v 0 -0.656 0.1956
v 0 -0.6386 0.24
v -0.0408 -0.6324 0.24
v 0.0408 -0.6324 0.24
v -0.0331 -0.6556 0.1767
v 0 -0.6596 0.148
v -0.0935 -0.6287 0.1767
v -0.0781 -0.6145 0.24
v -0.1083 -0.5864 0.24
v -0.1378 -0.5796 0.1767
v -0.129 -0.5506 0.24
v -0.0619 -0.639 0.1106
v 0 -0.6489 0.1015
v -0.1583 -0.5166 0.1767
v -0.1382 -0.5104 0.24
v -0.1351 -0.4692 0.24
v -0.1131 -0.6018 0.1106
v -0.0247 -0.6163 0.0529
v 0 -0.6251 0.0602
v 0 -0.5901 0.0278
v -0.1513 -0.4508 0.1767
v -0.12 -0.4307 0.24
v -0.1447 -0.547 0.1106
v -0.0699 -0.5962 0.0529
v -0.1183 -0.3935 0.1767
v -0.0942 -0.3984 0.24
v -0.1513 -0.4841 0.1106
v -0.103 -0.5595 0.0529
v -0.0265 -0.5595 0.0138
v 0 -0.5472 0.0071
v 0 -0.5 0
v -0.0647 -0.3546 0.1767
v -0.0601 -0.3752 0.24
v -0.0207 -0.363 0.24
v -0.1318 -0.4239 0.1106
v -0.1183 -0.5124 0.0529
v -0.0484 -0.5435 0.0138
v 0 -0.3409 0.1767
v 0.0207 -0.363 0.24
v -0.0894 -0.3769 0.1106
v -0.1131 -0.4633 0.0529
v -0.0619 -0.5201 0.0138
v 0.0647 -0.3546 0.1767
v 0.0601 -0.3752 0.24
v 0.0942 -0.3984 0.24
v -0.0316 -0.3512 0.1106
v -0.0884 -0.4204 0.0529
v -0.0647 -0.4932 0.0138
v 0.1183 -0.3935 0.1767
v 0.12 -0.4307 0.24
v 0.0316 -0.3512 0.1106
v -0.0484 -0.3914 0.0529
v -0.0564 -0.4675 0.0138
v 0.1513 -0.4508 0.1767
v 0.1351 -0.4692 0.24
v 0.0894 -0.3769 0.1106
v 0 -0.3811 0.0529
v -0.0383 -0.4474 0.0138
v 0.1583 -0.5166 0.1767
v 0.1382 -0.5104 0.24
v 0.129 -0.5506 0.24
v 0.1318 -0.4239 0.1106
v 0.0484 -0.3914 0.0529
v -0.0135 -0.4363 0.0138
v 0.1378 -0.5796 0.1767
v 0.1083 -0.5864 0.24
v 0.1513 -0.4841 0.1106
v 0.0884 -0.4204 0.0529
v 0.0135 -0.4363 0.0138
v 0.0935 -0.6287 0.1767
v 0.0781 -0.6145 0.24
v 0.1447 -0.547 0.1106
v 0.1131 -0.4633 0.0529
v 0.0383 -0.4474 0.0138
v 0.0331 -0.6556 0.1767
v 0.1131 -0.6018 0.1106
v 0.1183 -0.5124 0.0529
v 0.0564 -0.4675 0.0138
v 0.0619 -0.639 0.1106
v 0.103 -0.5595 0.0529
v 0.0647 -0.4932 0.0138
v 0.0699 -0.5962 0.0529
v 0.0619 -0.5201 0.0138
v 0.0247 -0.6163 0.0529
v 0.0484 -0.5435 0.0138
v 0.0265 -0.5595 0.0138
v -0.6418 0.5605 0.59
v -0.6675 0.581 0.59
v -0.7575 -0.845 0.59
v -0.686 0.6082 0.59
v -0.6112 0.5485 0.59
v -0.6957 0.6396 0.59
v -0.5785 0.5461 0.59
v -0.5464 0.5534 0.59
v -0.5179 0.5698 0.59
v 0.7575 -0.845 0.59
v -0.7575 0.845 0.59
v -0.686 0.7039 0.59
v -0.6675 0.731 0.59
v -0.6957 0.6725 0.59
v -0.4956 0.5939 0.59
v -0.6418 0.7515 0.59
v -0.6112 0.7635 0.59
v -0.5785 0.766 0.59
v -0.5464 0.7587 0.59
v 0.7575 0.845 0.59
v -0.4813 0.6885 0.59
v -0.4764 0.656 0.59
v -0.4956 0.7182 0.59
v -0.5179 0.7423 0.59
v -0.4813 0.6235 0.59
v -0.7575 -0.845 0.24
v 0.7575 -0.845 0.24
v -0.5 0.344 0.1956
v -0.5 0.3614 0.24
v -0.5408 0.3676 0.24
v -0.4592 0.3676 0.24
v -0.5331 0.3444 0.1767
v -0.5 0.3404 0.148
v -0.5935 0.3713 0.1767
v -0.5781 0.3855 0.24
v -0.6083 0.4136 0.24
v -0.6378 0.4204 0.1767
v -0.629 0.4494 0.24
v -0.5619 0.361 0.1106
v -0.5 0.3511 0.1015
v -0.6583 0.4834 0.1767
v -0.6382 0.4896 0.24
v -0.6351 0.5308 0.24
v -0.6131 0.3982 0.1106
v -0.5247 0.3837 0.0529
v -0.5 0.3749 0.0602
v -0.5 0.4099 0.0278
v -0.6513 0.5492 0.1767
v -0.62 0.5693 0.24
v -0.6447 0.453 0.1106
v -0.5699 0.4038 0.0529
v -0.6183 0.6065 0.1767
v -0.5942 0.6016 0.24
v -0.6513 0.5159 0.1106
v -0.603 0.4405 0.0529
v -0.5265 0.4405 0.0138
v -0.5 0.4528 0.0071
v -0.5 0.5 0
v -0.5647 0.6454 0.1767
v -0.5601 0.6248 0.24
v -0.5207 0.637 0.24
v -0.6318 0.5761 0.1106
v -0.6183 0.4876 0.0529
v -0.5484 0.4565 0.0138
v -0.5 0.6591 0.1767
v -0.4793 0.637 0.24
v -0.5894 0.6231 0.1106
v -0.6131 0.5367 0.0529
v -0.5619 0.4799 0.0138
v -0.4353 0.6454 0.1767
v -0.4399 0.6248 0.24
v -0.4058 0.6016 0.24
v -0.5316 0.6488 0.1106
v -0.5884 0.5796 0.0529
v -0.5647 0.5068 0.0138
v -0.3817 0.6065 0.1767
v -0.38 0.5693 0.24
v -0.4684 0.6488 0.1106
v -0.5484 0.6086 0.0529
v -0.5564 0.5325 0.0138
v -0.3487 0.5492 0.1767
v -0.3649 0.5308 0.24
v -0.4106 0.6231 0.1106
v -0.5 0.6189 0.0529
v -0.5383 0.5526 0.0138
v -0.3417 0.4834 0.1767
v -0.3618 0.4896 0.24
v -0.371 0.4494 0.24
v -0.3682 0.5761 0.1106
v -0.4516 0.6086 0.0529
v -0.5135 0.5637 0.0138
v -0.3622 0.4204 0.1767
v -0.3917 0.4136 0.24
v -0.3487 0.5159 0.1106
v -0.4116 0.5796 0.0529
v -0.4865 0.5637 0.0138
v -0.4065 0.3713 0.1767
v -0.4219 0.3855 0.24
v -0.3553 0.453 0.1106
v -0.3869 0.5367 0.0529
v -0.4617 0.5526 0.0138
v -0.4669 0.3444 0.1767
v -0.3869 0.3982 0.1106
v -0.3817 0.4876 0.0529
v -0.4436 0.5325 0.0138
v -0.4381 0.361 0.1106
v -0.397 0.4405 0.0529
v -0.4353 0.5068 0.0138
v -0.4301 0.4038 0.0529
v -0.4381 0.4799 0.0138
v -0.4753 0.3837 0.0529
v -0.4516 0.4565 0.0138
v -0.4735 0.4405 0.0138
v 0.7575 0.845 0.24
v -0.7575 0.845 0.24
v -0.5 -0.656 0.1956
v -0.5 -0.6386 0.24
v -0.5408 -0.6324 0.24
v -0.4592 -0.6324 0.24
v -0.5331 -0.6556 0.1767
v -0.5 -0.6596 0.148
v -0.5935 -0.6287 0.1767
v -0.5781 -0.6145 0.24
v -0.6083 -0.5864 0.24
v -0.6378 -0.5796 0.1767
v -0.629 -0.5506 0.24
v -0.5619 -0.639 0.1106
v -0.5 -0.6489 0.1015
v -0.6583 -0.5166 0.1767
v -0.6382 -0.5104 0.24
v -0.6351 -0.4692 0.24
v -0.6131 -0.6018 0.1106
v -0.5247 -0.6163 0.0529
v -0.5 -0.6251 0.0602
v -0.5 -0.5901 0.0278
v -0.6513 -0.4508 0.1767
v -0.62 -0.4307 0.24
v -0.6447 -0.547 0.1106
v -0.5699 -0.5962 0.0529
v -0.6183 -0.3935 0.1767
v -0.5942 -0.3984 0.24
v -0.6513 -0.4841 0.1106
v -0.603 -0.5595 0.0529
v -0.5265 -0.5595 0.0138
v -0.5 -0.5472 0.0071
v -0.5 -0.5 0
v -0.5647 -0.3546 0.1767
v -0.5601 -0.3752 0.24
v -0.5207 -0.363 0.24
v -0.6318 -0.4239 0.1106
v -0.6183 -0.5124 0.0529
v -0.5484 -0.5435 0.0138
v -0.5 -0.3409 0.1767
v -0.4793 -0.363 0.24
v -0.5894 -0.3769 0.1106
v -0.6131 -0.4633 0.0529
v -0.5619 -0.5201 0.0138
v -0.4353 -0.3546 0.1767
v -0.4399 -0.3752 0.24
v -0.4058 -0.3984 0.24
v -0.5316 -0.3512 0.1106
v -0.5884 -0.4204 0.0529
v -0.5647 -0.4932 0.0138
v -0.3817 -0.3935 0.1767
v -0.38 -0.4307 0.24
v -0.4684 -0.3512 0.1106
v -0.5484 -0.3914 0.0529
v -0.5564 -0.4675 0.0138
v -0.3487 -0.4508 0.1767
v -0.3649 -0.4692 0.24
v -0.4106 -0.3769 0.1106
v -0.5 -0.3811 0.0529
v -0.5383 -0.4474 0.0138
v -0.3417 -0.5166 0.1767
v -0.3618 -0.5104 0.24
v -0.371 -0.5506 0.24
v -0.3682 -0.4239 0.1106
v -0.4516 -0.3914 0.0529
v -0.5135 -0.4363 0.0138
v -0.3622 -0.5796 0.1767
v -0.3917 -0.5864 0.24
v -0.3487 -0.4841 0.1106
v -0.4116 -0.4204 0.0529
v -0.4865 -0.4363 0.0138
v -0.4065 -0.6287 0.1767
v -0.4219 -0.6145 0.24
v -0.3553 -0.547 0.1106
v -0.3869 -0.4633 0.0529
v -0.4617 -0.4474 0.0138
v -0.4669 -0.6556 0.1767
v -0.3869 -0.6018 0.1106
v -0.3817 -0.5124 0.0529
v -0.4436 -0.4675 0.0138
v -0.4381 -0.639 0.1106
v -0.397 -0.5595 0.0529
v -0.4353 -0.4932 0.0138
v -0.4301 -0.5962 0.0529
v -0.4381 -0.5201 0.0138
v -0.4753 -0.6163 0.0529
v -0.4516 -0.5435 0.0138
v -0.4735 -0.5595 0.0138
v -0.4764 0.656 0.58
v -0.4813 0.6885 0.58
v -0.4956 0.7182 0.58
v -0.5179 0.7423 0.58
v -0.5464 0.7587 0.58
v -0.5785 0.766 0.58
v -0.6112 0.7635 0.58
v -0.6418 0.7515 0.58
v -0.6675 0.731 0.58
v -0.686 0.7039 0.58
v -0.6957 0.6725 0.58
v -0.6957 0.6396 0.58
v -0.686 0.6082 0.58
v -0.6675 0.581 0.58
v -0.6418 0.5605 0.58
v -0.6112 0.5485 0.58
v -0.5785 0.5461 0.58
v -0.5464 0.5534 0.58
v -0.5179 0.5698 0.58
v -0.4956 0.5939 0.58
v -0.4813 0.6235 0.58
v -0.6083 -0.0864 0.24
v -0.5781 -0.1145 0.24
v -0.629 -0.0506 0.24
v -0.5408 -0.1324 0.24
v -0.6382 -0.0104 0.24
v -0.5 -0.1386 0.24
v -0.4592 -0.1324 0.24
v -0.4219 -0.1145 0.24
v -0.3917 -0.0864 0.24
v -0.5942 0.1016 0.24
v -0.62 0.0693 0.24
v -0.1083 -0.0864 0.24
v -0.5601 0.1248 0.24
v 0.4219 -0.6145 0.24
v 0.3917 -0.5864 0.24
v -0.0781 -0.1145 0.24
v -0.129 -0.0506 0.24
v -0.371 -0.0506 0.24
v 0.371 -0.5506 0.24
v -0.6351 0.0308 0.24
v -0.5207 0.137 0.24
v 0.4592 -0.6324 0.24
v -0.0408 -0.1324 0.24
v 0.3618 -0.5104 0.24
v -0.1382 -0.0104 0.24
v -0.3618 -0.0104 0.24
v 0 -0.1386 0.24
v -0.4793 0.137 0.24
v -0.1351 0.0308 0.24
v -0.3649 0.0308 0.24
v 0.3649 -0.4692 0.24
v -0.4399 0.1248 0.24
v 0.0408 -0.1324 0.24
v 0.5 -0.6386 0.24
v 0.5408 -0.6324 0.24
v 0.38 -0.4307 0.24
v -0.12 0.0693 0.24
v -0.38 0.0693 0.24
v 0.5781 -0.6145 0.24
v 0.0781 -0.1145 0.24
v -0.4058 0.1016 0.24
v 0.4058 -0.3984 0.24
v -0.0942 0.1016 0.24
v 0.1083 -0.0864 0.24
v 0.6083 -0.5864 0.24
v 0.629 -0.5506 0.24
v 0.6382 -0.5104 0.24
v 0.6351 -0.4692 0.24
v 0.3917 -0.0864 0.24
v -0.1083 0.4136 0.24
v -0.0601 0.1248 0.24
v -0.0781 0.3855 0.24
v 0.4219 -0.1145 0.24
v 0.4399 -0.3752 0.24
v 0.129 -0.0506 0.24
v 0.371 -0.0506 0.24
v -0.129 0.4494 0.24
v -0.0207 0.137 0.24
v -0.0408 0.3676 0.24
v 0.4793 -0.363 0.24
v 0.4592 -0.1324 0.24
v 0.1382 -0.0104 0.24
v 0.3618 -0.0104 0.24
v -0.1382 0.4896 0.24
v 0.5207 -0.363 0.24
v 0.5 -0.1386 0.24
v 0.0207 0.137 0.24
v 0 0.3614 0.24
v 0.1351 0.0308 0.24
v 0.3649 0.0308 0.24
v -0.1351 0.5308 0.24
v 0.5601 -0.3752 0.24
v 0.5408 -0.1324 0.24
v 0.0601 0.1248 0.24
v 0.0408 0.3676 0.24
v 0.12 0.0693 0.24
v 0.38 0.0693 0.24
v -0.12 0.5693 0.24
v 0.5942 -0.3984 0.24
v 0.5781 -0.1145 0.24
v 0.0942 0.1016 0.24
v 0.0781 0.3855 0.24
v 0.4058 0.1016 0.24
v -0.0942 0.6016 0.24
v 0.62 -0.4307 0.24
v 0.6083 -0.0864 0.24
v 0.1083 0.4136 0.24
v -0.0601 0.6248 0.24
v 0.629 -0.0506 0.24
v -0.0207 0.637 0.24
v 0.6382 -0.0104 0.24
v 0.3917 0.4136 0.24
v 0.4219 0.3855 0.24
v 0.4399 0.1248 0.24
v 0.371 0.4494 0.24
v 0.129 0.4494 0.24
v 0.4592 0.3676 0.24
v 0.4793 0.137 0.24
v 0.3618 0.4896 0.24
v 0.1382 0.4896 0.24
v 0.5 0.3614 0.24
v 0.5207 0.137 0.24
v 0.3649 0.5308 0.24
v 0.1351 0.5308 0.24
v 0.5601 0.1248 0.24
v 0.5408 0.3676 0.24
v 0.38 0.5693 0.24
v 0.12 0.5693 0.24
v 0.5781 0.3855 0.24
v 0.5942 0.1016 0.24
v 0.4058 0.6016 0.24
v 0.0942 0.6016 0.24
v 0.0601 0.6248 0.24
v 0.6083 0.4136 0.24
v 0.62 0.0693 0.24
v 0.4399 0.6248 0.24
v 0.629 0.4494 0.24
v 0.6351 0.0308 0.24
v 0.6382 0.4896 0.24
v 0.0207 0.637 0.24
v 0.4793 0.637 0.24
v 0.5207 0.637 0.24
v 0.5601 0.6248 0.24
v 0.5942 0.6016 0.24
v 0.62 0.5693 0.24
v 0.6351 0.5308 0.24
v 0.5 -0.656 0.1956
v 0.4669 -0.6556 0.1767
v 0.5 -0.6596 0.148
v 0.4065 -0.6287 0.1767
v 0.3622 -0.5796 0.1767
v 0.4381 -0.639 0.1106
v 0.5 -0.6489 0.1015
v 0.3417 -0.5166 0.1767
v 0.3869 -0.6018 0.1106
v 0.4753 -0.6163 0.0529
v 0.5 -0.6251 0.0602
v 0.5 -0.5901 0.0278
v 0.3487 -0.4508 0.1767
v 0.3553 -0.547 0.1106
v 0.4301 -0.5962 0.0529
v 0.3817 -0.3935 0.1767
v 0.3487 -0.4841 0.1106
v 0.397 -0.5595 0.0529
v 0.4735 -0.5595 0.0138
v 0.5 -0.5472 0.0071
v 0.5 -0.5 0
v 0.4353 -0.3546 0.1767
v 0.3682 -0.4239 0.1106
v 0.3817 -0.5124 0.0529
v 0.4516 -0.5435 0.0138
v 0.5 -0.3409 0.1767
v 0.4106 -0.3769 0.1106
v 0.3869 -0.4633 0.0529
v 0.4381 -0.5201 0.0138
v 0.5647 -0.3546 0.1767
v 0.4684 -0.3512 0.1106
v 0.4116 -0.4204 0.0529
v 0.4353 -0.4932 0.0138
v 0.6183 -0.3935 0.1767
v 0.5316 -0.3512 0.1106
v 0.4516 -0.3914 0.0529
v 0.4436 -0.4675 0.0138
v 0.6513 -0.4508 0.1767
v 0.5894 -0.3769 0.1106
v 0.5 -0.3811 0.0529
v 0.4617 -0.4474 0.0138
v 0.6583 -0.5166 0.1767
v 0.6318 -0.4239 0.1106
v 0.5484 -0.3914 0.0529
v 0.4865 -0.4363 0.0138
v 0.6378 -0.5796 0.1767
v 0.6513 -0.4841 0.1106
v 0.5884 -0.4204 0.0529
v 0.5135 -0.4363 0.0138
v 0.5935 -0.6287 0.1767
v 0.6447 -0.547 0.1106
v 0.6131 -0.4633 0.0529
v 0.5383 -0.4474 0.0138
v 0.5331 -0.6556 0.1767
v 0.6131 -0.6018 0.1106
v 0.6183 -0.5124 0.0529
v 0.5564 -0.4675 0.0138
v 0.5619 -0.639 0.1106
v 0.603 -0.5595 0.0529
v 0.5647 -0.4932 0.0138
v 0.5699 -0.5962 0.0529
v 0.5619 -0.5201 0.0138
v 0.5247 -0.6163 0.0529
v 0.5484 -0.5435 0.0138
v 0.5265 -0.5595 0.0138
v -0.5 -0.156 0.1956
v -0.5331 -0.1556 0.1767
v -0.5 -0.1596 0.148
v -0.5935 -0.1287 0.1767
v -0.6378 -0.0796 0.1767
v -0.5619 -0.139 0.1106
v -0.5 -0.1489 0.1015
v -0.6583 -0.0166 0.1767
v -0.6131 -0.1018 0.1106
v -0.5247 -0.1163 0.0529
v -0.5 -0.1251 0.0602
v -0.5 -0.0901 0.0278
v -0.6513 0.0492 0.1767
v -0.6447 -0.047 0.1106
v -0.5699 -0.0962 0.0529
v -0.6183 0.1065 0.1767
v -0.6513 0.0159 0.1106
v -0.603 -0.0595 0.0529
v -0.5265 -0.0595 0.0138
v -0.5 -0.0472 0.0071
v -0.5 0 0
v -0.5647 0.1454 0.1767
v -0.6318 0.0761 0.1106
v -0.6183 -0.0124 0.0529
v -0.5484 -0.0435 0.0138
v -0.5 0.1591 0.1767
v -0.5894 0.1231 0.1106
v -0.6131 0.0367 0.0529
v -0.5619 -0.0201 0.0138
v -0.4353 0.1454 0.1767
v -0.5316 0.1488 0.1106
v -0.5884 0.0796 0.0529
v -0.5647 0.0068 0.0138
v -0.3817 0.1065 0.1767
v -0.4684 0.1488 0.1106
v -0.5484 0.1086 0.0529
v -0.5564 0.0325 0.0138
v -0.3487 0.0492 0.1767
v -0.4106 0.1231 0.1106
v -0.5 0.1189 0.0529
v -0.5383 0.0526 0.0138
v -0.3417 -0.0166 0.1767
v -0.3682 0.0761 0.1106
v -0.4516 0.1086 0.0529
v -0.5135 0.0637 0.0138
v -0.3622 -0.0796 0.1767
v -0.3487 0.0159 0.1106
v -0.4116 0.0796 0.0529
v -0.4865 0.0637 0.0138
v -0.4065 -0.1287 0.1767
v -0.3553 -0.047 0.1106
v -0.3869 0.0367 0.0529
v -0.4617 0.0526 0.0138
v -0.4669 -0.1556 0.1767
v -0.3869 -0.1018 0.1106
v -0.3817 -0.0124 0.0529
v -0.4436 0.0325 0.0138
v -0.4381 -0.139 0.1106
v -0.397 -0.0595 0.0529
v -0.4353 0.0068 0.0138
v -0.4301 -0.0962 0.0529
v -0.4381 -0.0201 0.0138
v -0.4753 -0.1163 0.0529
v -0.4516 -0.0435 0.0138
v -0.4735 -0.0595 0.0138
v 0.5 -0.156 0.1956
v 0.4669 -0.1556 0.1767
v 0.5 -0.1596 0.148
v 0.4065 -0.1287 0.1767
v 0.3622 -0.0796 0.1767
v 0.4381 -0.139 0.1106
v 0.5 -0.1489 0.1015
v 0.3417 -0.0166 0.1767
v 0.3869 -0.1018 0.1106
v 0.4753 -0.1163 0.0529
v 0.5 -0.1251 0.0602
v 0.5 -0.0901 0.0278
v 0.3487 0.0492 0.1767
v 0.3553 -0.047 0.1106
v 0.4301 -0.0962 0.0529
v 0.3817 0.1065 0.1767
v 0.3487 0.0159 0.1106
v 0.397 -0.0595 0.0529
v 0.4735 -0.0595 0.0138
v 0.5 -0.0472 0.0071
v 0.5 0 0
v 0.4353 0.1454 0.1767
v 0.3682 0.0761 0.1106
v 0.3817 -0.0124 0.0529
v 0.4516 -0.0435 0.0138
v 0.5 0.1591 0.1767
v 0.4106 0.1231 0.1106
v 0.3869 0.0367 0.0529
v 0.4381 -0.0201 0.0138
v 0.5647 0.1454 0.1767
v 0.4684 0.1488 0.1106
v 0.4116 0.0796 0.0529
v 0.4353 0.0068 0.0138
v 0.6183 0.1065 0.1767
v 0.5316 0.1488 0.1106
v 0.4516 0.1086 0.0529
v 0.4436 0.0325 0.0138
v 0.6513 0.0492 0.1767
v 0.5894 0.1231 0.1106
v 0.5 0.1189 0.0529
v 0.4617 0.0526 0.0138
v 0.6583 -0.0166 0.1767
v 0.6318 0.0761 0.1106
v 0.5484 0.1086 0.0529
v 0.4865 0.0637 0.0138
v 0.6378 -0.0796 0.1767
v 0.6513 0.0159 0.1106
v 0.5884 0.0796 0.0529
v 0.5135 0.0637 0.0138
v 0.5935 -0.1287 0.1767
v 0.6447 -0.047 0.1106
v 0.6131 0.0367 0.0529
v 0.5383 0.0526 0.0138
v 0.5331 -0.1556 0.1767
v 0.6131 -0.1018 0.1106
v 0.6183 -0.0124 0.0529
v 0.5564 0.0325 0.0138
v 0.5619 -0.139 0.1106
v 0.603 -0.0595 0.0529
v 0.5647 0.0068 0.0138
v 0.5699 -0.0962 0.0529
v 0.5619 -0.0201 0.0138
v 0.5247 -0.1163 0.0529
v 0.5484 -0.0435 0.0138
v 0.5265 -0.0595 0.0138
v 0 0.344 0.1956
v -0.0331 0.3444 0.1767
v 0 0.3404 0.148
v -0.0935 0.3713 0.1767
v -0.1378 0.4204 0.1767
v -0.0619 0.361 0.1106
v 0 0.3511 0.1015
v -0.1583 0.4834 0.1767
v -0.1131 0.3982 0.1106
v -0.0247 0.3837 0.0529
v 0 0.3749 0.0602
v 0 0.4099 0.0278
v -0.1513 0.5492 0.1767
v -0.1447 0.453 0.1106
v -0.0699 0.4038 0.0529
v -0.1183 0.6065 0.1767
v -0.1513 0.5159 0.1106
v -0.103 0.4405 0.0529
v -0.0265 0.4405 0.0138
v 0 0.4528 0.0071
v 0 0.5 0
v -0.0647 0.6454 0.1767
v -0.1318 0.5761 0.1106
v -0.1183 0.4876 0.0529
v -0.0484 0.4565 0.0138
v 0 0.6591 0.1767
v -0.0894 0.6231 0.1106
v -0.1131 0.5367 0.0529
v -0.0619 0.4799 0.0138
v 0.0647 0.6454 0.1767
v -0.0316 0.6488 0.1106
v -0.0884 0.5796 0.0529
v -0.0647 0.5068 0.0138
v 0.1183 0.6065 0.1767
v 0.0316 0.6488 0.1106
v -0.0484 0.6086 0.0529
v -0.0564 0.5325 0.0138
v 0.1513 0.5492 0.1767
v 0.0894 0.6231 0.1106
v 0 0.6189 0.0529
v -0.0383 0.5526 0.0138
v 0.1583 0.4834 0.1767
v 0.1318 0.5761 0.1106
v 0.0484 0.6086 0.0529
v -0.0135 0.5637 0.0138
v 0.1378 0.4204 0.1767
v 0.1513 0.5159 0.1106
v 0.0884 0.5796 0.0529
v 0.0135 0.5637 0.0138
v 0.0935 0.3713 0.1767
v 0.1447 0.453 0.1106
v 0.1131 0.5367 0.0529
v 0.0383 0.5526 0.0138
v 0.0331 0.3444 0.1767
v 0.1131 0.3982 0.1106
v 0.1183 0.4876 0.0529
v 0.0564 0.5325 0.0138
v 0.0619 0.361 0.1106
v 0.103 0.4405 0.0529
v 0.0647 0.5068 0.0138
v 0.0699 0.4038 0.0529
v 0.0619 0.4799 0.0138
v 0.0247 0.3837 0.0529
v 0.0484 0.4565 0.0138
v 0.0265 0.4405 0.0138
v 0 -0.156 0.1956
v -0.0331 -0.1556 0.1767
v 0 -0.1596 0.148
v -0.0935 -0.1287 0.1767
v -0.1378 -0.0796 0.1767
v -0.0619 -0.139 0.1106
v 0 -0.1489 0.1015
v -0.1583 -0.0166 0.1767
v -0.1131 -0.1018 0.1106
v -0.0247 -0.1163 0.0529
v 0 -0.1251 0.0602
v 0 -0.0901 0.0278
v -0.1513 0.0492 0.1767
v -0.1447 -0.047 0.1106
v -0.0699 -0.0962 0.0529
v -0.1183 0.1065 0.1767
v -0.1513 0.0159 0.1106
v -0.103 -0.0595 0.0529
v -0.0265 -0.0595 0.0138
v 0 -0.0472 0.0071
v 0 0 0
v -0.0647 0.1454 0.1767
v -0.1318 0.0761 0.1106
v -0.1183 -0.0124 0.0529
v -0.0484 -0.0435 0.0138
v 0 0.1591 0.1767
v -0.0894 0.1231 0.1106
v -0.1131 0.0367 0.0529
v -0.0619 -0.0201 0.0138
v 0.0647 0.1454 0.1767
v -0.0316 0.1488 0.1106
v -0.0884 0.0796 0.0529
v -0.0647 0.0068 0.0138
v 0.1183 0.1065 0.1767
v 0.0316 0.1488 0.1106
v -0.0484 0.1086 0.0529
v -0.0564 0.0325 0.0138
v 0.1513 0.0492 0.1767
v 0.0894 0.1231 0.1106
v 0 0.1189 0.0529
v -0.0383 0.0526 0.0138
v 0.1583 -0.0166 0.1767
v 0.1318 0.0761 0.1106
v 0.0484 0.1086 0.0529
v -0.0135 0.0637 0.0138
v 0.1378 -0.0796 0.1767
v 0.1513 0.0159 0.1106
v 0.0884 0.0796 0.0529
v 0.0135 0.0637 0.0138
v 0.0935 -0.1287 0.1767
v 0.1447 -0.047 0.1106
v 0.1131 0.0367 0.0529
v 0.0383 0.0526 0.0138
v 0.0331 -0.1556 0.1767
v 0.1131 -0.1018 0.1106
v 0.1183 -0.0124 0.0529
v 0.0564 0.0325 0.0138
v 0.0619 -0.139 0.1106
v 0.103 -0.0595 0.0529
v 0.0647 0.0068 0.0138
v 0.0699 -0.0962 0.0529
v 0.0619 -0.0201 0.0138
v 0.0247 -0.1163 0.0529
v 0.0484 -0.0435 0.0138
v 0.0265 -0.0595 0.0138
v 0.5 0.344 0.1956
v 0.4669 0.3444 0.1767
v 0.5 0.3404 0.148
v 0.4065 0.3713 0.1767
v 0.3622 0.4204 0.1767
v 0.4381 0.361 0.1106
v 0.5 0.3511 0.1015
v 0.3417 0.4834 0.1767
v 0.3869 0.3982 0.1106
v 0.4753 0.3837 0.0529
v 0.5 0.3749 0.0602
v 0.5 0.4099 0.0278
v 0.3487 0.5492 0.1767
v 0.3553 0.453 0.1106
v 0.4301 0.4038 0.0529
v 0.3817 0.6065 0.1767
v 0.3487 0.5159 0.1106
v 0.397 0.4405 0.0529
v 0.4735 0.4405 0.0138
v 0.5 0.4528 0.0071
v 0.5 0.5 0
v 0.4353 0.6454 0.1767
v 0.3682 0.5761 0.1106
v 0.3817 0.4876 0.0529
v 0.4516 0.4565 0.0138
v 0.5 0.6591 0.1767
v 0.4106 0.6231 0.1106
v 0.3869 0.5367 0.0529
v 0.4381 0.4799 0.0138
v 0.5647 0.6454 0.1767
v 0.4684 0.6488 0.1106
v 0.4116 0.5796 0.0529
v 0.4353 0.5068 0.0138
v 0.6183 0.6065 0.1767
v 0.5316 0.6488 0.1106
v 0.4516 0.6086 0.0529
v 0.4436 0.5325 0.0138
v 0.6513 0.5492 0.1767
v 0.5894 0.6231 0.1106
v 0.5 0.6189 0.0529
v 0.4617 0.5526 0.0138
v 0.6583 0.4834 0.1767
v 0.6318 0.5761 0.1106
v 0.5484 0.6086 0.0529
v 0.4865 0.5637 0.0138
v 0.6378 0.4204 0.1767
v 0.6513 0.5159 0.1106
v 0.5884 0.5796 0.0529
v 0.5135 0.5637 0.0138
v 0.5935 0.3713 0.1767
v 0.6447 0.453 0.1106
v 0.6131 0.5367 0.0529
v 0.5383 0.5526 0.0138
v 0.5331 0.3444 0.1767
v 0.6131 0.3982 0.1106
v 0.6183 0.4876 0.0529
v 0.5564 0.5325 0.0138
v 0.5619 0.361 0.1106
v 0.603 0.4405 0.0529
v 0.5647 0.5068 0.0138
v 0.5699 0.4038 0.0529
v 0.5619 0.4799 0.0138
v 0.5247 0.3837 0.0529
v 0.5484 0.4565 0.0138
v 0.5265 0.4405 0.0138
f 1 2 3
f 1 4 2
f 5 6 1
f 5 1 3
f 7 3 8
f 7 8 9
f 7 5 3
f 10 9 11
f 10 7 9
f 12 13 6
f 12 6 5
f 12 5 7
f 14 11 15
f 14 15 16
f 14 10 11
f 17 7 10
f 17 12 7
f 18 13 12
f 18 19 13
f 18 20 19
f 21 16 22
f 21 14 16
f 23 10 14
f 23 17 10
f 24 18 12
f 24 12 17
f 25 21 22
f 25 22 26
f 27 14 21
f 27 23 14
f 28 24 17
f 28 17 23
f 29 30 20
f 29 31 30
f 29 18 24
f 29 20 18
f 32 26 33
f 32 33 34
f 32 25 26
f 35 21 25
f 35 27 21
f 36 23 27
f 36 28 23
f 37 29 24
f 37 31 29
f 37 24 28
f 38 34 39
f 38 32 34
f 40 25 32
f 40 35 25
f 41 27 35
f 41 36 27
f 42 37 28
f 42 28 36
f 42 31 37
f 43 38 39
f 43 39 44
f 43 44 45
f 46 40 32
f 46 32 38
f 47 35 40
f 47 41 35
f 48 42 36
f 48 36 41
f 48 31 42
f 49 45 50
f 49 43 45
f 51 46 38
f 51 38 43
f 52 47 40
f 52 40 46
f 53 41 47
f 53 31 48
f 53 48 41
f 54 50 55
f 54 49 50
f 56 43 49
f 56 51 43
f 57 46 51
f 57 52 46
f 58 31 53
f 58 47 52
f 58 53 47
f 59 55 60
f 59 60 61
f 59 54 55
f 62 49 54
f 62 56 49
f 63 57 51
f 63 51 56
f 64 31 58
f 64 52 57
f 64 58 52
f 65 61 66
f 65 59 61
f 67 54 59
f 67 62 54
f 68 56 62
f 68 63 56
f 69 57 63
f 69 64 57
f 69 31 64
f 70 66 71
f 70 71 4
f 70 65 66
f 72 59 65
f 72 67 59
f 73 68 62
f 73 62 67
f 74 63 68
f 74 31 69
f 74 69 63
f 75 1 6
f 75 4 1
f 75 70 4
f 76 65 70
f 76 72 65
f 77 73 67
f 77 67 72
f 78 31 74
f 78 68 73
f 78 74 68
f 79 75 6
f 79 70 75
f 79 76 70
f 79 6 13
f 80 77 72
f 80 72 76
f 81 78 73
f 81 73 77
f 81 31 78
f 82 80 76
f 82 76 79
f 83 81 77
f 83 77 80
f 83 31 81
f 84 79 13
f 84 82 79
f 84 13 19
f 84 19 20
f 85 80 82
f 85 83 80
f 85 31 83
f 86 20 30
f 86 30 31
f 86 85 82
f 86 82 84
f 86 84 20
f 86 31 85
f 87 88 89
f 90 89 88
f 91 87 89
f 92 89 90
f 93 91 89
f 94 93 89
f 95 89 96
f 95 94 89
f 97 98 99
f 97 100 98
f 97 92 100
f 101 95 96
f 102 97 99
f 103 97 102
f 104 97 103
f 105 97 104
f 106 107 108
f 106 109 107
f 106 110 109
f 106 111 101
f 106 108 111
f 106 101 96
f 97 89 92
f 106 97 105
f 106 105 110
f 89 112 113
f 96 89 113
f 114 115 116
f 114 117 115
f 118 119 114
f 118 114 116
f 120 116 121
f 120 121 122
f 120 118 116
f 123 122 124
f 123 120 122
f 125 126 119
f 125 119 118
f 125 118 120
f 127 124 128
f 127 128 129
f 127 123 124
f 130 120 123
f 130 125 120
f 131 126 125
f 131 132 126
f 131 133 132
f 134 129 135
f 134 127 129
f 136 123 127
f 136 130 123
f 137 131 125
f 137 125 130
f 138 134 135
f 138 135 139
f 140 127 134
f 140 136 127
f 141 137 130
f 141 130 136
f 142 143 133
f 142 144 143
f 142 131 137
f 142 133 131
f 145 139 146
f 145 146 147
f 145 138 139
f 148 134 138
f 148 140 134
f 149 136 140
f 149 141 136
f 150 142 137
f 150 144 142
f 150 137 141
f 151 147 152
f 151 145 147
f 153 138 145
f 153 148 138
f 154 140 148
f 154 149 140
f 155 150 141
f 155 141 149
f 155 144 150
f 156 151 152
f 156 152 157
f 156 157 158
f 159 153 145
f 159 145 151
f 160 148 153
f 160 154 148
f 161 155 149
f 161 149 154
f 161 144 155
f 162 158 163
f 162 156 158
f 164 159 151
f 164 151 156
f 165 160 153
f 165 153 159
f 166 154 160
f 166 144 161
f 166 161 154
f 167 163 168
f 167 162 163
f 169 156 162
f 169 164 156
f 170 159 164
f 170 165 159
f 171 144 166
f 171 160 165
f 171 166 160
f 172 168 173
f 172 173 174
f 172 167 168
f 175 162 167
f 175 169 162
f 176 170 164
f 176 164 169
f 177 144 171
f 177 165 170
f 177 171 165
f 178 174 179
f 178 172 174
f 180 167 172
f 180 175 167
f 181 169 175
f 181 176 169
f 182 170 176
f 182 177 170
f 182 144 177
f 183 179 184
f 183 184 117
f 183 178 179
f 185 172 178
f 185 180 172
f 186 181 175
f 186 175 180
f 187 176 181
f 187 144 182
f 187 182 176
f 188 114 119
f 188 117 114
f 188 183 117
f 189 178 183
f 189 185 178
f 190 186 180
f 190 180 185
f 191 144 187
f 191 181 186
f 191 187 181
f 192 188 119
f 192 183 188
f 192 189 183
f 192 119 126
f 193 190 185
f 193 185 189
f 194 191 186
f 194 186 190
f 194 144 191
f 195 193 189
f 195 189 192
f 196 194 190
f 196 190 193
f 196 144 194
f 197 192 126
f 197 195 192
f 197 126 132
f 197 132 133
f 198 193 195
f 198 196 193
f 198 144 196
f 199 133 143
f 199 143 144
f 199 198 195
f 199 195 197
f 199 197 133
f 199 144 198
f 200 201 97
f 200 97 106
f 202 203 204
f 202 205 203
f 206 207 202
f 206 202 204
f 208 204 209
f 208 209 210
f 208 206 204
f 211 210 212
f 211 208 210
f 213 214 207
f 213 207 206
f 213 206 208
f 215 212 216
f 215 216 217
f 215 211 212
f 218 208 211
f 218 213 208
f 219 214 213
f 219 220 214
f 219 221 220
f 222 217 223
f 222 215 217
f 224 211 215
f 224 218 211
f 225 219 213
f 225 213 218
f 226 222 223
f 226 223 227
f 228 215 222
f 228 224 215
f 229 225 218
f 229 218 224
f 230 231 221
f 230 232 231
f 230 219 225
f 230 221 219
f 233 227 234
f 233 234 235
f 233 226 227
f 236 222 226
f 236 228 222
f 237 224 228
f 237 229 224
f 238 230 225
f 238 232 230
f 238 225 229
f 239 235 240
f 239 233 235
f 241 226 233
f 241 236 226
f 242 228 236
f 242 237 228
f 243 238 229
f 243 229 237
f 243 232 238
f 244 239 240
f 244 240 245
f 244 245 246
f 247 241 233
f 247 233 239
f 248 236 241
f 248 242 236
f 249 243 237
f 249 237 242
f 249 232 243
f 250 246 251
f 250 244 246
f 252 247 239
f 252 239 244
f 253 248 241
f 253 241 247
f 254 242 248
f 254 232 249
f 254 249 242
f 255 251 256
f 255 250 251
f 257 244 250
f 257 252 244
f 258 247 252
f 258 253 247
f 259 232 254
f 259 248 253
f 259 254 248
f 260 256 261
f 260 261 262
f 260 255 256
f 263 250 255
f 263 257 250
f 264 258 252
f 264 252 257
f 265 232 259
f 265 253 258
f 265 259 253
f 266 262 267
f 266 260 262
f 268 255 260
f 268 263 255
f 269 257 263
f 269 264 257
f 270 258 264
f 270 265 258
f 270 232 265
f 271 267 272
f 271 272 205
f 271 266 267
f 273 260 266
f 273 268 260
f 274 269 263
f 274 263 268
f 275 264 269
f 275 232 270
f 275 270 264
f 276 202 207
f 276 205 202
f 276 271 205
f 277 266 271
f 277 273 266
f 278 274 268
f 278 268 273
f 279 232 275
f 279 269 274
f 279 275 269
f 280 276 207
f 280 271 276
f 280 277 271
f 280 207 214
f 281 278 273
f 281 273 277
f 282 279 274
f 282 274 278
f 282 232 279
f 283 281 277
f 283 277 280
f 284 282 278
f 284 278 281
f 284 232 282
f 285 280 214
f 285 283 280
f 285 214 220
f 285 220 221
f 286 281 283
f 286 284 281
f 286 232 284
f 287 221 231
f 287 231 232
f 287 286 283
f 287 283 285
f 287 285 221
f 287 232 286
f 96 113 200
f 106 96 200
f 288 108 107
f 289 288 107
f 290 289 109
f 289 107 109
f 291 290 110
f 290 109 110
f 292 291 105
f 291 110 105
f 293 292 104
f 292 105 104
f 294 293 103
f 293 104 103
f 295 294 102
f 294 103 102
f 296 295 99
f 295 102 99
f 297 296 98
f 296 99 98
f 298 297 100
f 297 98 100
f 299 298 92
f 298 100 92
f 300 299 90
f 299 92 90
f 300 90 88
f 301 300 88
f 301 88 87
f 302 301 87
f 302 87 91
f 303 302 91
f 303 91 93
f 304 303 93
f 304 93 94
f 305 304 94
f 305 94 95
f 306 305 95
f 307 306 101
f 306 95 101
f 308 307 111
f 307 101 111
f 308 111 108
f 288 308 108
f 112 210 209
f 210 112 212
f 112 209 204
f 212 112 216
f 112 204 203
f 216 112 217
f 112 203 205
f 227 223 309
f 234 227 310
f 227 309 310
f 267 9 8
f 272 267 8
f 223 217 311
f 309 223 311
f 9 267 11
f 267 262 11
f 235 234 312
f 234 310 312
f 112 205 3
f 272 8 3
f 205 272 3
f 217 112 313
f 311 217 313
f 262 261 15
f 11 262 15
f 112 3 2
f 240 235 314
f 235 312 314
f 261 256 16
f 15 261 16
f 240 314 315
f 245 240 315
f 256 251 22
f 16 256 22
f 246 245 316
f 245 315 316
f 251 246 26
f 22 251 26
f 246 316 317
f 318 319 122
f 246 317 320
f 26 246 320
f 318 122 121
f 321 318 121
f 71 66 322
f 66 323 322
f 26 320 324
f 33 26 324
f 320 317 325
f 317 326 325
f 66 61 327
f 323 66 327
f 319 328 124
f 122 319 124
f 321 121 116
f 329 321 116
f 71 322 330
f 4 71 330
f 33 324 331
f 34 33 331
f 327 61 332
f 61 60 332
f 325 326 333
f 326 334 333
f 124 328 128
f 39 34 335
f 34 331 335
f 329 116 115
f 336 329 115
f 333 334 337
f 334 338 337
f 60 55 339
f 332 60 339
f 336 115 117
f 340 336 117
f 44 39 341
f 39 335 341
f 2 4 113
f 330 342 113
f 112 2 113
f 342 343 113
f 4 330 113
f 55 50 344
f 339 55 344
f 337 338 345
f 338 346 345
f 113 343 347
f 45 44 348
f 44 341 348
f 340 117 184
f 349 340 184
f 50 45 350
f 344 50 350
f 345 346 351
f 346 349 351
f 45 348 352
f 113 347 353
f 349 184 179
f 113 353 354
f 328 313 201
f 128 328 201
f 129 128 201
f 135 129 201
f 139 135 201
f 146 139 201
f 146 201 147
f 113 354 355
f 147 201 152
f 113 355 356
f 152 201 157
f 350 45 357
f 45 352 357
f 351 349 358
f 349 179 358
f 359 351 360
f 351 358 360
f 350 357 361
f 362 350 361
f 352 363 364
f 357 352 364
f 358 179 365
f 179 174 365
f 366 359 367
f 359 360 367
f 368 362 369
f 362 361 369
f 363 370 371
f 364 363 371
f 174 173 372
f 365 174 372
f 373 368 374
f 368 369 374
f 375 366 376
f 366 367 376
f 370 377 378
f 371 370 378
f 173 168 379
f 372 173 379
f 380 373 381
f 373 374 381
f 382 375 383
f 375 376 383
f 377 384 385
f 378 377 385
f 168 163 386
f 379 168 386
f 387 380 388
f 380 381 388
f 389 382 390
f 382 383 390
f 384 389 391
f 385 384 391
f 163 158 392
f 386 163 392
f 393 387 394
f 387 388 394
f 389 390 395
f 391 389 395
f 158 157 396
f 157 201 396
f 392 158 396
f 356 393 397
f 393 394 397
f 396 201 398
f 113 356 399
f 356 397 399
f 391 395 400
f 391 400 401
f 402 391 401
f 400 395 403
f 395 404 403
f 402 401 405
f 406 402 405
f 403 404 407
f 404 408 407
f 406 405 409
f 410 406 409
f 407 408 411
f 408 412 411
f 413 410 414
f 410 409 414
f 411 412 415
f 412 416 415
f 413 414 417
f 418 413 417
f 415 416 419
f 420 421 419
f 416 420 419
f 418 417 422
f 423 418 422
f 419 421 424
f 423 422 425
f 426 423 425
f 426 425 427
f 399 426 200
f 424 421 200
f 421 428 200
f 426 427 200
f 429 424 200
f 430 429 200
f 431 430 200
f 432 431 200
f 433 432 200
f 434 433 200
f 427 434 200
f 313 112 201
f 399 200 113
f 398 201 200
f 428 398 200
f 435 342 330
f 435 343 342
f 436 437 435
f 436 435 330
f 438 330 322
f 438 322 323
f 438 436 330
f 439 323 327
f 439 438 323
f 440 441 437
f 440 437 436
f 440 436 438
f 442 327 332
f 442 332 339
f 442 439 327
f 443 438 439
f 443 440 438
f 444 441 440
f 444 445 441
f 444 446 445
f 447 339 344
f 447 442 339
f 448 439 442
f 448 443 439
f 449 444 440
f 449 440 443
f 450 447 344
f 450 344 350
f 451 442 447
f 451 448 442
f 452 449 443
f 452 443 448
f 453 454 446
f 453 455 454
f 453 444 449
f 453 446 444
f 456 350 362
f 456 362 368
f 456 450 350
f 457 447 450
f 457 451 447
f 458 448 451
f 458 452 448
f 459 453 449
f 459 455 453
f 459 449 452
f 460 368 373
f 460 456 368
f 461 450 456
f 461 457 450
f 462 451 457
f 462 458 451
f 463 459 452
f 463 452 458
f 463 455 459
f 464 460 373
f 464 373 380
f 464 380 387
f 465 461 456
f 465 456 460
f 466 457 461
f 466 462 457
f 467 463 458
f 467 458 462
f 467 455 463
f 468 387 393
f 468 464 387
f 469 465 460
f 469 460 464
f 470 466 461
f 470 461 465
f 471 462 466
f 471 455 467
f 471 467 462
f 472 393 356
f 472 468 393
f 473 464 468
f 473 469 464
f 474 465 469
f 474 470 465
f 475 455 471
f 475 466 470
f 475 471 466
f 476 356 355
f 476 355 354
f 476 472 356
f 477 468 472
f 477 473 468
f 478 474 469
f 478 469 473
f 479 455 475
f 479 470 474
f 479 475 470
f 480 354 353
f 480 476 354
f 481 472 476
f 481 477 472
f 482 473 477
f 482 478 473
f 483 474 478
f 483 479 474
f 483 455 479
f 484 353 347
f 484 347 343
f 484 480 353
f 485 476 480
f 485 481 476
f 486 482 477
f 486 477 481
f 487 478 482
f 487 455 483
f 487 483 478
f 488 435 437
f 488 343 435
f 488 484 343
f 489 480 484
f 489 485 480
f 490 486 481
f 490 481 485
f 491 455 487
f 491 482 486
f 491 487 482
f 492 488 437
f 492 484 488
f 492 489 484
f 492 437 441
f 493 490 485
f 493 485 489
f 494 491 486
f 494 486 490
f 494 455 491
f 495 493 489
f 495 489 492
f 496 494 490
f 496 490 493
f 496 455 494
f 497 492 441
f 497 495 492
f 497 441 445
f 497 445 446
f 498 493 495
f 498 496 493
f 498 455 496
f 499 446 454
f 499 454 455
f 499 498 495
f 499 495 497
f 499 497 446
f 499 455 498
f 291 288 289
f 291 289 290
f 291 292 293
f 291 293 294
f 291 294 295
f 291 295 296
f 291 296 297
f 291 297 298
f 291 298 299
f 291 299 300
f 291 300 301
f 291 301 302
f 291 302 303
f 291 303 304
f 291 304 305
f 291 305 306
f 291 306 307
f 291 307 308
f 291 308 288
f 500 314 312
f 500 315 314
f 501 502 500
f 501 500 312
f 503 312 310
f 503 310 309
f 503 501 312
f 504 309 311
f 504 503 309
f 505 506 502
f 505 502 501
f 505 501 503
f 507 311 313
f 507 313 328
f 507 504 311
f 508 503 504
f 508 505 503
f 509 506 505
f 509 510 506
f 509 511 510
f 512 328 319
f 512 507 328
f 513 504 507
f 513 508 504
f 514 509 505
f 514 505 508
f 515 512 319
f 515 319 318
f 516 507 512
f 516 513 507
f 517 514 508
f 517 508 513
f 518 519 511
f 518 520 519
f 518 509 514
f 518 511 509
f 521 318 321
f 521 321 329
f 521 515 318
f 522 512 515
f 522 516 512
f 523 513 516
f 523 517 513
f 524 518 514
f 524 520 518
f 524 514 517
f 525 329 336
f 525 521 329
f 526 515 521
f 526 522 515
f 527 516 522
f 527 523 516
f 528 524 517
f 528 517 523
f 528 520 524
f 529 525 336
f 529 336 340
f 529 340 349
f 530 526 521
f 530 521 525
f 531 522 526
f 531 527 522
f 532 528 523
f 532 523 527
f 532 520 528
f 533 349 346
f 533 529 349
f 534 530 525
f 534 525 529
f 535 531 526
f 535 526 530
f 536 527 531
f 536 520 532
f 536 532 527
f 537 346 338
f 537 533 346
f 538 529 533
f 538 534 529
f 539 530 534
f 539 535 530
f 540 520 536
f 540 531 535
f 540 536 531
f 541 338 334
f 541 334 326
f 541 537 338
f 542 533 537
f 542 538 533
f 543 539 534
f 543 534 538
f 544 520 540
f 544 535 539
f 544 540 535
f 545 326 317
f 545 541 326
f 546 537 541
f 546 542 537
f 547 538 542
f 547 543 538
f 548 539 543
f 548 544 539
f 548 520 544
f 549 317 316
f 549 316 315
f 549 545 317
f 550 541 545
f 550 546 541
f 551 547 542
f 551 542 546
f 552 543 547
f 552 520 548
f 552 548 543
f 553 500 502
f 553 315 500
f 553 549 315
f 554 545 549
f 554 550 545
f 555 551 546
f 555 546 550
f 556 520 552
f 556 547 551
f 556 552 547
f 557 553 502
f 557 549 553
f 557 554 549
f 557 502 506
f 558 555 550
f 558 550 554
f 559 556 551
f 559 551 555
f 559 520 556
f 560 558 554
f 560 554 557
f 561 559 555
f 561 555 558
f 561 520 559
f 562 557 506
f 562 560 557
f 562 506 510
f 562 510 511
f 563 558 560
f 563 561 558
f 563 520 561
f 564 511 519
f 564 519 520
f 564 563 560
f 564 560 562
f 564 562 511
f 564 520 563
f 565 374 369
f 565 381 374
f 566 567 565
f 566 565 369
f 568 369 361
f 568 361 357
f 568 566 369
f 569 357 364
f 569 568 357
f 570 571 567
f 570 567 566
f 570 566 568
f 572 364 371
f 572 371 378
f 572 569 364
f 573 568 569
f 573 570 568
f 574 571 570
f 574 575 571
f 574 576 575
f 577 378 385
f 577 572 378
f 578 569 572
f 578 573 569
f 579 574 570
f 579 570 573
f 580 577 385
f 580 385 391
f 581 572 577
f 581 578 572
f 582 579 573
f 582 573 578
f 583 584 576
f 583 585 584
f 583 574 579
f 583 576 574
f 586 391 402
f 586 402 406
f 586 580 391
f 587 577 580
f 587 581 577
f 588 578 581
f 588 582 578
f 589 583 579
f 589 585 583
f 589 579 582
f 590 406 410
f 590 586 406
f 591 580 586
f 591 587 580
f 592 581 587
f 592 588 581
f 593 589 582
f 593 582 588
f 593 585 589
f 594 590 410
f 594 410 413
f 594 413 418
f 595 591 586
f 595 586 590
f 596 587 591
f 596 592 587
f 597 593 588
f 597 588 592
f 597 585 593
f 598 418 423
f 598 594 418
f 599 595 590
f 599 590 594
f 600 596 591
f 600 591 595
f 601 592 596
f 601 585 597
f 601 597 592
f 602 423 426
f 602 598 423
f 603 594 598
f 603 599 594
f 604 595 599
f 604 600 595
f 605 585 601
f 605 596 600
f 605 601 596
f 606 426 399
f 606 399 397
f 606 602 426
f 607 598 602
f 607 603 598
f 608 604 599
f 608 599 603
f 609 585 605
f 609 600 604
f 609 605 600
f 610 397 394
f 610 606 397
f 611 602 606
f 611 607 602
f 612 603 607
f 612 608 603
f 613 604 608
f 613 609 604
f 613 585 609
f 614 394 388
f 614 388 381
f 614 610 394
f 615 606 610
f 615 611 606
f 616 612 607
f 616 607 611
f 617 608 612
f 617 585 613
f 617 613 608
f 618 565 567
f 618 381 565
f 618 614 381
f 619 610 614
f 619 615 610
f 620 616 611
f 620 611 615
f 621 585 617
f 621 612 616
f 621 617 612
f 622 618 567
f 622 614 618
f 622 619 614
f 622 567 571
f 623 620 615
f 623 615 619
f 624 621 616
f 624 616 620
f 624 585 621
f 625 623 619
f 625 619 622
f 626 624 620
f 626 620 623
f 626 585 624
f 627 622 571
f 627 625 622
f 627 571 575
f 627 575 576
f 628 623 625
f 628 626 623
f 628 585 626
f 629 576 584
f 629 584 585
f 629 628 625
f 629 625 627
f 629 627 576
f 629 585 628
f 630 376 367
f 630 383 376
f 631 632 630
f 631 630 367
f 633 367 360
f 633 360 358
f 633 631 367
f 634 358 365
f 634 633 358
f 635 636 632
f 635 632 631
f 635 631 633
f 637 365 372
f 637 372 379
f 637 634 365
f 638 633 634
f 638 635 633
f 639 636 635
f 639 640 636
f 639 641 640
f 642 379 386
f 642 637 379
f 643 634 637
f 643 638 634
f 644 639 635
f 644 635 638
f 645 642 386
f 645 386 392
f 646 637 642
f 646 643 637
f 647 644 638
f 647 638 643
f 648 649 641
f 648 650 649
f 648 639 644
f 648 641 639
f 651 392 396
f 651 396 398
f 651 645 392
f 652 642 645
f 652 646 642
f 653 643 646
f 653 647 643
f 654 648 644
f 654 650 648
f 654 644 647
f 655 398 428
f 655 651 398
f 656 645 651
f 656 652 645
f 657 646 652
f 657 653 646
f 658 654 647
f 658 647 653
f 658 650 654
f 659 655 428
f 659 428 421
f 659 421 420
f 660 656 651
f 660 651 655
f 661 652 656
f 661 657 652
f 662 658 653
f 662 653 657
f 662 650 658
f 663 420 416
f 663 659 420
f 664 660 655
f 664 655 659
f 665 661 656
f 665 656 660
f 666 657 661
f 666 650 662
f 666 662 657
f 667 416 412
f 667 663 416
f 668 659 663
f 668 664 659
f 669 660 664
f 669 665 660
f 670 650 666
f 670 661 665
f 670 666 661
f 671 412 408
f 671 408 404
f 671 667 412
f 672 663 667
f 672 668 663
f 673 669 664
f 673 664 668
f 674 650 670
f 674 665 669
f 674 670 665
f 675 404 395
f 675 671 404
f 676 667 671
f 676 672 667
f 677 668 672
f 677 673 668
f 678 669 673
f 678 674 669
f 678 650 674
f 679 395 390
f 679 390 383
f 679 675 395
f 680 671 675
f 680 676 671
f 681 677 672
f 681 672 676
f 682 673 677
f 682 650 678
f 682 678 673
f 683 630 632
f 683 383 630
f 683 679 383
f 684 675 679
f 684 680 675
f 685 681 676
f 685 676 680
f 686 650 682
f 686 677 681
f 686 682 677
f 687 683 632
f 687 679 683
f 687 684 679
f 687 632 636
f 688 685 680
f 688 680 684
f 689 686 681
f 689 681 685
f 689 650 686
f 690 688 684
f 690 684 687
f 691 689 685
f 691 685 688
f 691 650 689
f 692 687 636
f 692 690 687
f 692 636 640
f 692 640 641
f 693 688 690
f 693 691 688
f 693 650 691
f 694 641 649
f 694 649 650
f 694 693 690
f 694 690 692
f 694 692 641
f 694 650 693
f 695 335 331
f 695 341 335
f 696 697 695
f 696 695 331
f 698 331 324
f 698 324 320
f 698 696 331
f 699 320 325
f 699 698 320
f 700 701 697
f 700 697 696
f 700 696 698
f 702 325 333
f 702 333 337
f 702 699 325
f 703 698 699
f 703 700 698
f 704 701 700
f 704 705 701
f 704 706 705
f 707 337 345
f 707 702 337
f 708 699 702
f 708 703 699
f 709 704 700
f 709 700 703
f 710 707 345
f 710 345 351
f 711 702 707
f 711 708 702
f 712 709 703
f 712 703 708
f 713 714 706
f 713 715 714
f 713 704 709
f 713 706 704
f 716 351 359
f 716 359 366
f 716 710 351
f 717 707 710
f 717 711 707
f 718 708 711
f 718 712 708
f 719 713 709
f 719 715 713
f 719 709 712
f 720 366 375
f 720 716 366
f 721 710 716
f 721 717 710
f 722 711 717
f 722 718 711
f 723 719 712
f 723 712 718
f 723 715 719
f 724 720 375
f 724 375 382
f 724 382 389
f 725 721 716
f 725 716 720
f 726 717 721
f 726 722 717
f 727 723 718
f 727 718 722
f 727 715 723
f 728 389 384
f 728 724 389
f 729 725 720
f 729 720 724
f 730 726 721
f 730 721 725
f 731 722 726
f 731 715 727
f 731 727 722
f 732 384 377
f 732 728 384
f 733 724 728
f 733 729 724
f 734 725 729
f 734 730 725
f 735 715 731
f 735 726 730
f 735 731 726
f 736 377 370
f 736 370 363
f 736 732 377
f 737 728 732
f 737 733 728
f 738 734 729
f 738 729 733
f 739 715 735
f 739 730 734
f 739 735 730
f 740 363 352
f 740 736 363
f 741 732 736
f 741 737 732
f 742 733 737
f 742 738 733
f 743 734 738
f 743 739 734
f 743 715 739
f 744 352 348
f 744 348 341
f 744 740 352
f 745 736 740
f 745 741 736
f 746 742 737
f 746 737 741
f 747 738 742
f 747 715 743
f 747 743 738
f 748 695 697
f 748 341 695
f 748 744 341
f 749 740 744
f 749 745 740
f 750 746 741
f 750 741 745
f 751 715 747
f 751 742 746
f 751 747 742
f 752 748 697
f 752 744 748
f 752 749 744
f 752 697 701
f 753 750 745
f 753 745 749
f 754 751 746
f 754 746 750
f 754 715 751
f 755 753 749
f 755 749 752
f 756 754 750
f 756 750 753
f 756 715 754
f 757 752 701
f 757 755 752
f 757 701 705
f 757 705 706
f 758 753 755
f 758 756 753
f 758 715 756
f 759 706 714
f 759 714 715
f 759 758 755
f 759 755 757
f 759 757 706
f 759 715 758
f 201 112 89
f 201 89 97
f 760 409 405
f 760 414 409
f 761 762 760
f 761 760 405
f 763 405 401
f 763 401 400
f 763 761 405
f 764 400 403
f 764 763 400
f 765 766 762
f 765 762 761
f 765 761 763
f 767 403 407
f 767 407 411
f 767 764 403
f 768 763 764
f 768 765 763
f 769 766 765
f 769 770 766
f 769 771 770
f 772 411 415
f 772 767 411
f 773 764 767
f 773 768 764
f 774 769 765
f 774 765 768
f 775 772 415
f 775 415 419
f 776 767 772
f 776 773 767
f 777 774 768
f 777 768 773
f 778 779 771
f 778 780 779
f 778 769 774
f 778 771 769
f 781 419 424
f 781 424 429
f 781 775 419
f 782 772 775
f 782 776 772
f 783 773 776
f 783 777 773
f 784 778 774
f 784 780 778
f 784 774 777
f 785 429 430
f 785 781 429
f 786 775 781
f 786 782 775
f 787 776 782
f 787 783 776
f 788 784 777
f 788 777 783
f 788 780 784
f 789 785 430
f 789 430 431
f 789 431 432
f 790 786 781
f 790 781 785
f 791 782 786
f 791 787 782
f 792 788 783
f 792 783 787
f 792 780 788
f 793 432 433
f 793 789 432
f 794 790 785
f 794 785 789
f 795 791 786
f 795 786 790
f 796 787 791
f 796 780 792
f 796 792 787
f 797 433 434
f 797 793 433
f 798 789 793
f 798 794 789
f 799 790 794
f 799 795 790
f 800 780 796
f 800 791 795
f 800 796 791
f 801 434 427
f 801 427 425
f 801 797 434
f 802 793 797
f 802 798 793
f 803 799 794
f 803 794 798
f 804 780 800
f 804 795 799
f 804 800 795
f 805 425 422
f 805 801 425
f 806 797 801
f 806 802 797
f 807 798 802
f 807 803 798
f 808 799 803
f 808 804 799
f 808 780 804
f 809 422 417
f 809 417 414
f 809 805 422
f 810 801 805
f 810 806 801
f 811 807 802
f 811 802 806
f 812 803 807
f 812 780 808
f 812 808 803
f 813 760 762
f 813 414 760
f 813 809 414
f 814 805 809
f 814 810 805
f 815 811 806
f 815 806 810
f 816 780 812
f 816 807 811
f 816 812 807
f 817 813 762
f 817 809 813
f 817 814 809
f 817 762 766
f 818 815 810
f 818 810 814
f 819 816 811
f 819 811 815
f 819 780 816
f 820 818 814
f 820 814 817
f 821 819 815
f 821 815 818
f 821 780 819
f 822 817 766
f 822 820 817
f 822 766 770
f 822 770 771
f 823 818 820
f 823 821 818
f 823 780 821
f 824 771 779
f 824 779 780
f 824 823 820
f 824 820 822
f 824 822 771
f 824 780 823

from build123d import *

# Parameters (mm, degrees)
BOSS_EXTRUDE1_START  = 0.24
SKETCH1_W            = 1.515
SKETCH1_H            = 1.69
BOSS_EXTRUDE1_DEPTH  = 0.35
SKETCH2_R            = 0.110270935
CUT_EXTRUDE1_DEPTH   = 0.01
LPATTERN1_COUNT      = 3
LPATTERN1_PITCH      = 0.5
LPATTERN1_COUNT_DIR2 = 3
LPATTERN1_PITCH_DIR2 = 0.5


with BuildPart() as part:
    # Sketch1 → Boss-Extrude1 (new body)
    with BuildSketch(Plane.XY.offset(BOSS_EXTRUDE1_START)):
        Rectangle(SKETCH1_W, SKETCH1_H)
    extrude(amount=BOSS_EXTRUDE1_DEPTH)

    # Sketch2 → Cut-Extrude1 (cut)
    with BuildSketch(Plane.XY.offset(0.59)):
        with Locations((-0.586697282, 0.656038771)):
            Circle(SKETCH2_R)
    extrude(amount=-CUT_EXTRUDE1_DEPTH, mode=Mode.SUBTRACT)

    # Sketch3 → Revolve1 (revolve)
    with BuildSketch(Plane(origin=(0.5, 0, 0), x_dir=(0, 0, -1), z_dir=(1, 0, 0))):
        with BuildLine():
            Line((-0.24, 0.5), (-0.24, 0.361435935))
            ThreePointArc((-0.24, 0.361435935), (-0.08, 0.361435935), (0, 0.5))
            Line((0, 0.5), (-0.24, 0.5))
        make_face()
    revolve1 = revolve(axis=Axis((0.5, 0.5, 0.24), (0, 0, -1)))

    # LPattern1: Revolve1 3 × 3
    with Locations(*[(-i * LPATTERN1_PITCH, -j * LPATTERN1_PITCH_DIR2, 0) for i in range(LPATTERN1_COUNT) for j in range(LPATTERN1_COUNT_DIR2) if (i, j) != (0, 0)]):
        add(revolve1)


solid = part.part
